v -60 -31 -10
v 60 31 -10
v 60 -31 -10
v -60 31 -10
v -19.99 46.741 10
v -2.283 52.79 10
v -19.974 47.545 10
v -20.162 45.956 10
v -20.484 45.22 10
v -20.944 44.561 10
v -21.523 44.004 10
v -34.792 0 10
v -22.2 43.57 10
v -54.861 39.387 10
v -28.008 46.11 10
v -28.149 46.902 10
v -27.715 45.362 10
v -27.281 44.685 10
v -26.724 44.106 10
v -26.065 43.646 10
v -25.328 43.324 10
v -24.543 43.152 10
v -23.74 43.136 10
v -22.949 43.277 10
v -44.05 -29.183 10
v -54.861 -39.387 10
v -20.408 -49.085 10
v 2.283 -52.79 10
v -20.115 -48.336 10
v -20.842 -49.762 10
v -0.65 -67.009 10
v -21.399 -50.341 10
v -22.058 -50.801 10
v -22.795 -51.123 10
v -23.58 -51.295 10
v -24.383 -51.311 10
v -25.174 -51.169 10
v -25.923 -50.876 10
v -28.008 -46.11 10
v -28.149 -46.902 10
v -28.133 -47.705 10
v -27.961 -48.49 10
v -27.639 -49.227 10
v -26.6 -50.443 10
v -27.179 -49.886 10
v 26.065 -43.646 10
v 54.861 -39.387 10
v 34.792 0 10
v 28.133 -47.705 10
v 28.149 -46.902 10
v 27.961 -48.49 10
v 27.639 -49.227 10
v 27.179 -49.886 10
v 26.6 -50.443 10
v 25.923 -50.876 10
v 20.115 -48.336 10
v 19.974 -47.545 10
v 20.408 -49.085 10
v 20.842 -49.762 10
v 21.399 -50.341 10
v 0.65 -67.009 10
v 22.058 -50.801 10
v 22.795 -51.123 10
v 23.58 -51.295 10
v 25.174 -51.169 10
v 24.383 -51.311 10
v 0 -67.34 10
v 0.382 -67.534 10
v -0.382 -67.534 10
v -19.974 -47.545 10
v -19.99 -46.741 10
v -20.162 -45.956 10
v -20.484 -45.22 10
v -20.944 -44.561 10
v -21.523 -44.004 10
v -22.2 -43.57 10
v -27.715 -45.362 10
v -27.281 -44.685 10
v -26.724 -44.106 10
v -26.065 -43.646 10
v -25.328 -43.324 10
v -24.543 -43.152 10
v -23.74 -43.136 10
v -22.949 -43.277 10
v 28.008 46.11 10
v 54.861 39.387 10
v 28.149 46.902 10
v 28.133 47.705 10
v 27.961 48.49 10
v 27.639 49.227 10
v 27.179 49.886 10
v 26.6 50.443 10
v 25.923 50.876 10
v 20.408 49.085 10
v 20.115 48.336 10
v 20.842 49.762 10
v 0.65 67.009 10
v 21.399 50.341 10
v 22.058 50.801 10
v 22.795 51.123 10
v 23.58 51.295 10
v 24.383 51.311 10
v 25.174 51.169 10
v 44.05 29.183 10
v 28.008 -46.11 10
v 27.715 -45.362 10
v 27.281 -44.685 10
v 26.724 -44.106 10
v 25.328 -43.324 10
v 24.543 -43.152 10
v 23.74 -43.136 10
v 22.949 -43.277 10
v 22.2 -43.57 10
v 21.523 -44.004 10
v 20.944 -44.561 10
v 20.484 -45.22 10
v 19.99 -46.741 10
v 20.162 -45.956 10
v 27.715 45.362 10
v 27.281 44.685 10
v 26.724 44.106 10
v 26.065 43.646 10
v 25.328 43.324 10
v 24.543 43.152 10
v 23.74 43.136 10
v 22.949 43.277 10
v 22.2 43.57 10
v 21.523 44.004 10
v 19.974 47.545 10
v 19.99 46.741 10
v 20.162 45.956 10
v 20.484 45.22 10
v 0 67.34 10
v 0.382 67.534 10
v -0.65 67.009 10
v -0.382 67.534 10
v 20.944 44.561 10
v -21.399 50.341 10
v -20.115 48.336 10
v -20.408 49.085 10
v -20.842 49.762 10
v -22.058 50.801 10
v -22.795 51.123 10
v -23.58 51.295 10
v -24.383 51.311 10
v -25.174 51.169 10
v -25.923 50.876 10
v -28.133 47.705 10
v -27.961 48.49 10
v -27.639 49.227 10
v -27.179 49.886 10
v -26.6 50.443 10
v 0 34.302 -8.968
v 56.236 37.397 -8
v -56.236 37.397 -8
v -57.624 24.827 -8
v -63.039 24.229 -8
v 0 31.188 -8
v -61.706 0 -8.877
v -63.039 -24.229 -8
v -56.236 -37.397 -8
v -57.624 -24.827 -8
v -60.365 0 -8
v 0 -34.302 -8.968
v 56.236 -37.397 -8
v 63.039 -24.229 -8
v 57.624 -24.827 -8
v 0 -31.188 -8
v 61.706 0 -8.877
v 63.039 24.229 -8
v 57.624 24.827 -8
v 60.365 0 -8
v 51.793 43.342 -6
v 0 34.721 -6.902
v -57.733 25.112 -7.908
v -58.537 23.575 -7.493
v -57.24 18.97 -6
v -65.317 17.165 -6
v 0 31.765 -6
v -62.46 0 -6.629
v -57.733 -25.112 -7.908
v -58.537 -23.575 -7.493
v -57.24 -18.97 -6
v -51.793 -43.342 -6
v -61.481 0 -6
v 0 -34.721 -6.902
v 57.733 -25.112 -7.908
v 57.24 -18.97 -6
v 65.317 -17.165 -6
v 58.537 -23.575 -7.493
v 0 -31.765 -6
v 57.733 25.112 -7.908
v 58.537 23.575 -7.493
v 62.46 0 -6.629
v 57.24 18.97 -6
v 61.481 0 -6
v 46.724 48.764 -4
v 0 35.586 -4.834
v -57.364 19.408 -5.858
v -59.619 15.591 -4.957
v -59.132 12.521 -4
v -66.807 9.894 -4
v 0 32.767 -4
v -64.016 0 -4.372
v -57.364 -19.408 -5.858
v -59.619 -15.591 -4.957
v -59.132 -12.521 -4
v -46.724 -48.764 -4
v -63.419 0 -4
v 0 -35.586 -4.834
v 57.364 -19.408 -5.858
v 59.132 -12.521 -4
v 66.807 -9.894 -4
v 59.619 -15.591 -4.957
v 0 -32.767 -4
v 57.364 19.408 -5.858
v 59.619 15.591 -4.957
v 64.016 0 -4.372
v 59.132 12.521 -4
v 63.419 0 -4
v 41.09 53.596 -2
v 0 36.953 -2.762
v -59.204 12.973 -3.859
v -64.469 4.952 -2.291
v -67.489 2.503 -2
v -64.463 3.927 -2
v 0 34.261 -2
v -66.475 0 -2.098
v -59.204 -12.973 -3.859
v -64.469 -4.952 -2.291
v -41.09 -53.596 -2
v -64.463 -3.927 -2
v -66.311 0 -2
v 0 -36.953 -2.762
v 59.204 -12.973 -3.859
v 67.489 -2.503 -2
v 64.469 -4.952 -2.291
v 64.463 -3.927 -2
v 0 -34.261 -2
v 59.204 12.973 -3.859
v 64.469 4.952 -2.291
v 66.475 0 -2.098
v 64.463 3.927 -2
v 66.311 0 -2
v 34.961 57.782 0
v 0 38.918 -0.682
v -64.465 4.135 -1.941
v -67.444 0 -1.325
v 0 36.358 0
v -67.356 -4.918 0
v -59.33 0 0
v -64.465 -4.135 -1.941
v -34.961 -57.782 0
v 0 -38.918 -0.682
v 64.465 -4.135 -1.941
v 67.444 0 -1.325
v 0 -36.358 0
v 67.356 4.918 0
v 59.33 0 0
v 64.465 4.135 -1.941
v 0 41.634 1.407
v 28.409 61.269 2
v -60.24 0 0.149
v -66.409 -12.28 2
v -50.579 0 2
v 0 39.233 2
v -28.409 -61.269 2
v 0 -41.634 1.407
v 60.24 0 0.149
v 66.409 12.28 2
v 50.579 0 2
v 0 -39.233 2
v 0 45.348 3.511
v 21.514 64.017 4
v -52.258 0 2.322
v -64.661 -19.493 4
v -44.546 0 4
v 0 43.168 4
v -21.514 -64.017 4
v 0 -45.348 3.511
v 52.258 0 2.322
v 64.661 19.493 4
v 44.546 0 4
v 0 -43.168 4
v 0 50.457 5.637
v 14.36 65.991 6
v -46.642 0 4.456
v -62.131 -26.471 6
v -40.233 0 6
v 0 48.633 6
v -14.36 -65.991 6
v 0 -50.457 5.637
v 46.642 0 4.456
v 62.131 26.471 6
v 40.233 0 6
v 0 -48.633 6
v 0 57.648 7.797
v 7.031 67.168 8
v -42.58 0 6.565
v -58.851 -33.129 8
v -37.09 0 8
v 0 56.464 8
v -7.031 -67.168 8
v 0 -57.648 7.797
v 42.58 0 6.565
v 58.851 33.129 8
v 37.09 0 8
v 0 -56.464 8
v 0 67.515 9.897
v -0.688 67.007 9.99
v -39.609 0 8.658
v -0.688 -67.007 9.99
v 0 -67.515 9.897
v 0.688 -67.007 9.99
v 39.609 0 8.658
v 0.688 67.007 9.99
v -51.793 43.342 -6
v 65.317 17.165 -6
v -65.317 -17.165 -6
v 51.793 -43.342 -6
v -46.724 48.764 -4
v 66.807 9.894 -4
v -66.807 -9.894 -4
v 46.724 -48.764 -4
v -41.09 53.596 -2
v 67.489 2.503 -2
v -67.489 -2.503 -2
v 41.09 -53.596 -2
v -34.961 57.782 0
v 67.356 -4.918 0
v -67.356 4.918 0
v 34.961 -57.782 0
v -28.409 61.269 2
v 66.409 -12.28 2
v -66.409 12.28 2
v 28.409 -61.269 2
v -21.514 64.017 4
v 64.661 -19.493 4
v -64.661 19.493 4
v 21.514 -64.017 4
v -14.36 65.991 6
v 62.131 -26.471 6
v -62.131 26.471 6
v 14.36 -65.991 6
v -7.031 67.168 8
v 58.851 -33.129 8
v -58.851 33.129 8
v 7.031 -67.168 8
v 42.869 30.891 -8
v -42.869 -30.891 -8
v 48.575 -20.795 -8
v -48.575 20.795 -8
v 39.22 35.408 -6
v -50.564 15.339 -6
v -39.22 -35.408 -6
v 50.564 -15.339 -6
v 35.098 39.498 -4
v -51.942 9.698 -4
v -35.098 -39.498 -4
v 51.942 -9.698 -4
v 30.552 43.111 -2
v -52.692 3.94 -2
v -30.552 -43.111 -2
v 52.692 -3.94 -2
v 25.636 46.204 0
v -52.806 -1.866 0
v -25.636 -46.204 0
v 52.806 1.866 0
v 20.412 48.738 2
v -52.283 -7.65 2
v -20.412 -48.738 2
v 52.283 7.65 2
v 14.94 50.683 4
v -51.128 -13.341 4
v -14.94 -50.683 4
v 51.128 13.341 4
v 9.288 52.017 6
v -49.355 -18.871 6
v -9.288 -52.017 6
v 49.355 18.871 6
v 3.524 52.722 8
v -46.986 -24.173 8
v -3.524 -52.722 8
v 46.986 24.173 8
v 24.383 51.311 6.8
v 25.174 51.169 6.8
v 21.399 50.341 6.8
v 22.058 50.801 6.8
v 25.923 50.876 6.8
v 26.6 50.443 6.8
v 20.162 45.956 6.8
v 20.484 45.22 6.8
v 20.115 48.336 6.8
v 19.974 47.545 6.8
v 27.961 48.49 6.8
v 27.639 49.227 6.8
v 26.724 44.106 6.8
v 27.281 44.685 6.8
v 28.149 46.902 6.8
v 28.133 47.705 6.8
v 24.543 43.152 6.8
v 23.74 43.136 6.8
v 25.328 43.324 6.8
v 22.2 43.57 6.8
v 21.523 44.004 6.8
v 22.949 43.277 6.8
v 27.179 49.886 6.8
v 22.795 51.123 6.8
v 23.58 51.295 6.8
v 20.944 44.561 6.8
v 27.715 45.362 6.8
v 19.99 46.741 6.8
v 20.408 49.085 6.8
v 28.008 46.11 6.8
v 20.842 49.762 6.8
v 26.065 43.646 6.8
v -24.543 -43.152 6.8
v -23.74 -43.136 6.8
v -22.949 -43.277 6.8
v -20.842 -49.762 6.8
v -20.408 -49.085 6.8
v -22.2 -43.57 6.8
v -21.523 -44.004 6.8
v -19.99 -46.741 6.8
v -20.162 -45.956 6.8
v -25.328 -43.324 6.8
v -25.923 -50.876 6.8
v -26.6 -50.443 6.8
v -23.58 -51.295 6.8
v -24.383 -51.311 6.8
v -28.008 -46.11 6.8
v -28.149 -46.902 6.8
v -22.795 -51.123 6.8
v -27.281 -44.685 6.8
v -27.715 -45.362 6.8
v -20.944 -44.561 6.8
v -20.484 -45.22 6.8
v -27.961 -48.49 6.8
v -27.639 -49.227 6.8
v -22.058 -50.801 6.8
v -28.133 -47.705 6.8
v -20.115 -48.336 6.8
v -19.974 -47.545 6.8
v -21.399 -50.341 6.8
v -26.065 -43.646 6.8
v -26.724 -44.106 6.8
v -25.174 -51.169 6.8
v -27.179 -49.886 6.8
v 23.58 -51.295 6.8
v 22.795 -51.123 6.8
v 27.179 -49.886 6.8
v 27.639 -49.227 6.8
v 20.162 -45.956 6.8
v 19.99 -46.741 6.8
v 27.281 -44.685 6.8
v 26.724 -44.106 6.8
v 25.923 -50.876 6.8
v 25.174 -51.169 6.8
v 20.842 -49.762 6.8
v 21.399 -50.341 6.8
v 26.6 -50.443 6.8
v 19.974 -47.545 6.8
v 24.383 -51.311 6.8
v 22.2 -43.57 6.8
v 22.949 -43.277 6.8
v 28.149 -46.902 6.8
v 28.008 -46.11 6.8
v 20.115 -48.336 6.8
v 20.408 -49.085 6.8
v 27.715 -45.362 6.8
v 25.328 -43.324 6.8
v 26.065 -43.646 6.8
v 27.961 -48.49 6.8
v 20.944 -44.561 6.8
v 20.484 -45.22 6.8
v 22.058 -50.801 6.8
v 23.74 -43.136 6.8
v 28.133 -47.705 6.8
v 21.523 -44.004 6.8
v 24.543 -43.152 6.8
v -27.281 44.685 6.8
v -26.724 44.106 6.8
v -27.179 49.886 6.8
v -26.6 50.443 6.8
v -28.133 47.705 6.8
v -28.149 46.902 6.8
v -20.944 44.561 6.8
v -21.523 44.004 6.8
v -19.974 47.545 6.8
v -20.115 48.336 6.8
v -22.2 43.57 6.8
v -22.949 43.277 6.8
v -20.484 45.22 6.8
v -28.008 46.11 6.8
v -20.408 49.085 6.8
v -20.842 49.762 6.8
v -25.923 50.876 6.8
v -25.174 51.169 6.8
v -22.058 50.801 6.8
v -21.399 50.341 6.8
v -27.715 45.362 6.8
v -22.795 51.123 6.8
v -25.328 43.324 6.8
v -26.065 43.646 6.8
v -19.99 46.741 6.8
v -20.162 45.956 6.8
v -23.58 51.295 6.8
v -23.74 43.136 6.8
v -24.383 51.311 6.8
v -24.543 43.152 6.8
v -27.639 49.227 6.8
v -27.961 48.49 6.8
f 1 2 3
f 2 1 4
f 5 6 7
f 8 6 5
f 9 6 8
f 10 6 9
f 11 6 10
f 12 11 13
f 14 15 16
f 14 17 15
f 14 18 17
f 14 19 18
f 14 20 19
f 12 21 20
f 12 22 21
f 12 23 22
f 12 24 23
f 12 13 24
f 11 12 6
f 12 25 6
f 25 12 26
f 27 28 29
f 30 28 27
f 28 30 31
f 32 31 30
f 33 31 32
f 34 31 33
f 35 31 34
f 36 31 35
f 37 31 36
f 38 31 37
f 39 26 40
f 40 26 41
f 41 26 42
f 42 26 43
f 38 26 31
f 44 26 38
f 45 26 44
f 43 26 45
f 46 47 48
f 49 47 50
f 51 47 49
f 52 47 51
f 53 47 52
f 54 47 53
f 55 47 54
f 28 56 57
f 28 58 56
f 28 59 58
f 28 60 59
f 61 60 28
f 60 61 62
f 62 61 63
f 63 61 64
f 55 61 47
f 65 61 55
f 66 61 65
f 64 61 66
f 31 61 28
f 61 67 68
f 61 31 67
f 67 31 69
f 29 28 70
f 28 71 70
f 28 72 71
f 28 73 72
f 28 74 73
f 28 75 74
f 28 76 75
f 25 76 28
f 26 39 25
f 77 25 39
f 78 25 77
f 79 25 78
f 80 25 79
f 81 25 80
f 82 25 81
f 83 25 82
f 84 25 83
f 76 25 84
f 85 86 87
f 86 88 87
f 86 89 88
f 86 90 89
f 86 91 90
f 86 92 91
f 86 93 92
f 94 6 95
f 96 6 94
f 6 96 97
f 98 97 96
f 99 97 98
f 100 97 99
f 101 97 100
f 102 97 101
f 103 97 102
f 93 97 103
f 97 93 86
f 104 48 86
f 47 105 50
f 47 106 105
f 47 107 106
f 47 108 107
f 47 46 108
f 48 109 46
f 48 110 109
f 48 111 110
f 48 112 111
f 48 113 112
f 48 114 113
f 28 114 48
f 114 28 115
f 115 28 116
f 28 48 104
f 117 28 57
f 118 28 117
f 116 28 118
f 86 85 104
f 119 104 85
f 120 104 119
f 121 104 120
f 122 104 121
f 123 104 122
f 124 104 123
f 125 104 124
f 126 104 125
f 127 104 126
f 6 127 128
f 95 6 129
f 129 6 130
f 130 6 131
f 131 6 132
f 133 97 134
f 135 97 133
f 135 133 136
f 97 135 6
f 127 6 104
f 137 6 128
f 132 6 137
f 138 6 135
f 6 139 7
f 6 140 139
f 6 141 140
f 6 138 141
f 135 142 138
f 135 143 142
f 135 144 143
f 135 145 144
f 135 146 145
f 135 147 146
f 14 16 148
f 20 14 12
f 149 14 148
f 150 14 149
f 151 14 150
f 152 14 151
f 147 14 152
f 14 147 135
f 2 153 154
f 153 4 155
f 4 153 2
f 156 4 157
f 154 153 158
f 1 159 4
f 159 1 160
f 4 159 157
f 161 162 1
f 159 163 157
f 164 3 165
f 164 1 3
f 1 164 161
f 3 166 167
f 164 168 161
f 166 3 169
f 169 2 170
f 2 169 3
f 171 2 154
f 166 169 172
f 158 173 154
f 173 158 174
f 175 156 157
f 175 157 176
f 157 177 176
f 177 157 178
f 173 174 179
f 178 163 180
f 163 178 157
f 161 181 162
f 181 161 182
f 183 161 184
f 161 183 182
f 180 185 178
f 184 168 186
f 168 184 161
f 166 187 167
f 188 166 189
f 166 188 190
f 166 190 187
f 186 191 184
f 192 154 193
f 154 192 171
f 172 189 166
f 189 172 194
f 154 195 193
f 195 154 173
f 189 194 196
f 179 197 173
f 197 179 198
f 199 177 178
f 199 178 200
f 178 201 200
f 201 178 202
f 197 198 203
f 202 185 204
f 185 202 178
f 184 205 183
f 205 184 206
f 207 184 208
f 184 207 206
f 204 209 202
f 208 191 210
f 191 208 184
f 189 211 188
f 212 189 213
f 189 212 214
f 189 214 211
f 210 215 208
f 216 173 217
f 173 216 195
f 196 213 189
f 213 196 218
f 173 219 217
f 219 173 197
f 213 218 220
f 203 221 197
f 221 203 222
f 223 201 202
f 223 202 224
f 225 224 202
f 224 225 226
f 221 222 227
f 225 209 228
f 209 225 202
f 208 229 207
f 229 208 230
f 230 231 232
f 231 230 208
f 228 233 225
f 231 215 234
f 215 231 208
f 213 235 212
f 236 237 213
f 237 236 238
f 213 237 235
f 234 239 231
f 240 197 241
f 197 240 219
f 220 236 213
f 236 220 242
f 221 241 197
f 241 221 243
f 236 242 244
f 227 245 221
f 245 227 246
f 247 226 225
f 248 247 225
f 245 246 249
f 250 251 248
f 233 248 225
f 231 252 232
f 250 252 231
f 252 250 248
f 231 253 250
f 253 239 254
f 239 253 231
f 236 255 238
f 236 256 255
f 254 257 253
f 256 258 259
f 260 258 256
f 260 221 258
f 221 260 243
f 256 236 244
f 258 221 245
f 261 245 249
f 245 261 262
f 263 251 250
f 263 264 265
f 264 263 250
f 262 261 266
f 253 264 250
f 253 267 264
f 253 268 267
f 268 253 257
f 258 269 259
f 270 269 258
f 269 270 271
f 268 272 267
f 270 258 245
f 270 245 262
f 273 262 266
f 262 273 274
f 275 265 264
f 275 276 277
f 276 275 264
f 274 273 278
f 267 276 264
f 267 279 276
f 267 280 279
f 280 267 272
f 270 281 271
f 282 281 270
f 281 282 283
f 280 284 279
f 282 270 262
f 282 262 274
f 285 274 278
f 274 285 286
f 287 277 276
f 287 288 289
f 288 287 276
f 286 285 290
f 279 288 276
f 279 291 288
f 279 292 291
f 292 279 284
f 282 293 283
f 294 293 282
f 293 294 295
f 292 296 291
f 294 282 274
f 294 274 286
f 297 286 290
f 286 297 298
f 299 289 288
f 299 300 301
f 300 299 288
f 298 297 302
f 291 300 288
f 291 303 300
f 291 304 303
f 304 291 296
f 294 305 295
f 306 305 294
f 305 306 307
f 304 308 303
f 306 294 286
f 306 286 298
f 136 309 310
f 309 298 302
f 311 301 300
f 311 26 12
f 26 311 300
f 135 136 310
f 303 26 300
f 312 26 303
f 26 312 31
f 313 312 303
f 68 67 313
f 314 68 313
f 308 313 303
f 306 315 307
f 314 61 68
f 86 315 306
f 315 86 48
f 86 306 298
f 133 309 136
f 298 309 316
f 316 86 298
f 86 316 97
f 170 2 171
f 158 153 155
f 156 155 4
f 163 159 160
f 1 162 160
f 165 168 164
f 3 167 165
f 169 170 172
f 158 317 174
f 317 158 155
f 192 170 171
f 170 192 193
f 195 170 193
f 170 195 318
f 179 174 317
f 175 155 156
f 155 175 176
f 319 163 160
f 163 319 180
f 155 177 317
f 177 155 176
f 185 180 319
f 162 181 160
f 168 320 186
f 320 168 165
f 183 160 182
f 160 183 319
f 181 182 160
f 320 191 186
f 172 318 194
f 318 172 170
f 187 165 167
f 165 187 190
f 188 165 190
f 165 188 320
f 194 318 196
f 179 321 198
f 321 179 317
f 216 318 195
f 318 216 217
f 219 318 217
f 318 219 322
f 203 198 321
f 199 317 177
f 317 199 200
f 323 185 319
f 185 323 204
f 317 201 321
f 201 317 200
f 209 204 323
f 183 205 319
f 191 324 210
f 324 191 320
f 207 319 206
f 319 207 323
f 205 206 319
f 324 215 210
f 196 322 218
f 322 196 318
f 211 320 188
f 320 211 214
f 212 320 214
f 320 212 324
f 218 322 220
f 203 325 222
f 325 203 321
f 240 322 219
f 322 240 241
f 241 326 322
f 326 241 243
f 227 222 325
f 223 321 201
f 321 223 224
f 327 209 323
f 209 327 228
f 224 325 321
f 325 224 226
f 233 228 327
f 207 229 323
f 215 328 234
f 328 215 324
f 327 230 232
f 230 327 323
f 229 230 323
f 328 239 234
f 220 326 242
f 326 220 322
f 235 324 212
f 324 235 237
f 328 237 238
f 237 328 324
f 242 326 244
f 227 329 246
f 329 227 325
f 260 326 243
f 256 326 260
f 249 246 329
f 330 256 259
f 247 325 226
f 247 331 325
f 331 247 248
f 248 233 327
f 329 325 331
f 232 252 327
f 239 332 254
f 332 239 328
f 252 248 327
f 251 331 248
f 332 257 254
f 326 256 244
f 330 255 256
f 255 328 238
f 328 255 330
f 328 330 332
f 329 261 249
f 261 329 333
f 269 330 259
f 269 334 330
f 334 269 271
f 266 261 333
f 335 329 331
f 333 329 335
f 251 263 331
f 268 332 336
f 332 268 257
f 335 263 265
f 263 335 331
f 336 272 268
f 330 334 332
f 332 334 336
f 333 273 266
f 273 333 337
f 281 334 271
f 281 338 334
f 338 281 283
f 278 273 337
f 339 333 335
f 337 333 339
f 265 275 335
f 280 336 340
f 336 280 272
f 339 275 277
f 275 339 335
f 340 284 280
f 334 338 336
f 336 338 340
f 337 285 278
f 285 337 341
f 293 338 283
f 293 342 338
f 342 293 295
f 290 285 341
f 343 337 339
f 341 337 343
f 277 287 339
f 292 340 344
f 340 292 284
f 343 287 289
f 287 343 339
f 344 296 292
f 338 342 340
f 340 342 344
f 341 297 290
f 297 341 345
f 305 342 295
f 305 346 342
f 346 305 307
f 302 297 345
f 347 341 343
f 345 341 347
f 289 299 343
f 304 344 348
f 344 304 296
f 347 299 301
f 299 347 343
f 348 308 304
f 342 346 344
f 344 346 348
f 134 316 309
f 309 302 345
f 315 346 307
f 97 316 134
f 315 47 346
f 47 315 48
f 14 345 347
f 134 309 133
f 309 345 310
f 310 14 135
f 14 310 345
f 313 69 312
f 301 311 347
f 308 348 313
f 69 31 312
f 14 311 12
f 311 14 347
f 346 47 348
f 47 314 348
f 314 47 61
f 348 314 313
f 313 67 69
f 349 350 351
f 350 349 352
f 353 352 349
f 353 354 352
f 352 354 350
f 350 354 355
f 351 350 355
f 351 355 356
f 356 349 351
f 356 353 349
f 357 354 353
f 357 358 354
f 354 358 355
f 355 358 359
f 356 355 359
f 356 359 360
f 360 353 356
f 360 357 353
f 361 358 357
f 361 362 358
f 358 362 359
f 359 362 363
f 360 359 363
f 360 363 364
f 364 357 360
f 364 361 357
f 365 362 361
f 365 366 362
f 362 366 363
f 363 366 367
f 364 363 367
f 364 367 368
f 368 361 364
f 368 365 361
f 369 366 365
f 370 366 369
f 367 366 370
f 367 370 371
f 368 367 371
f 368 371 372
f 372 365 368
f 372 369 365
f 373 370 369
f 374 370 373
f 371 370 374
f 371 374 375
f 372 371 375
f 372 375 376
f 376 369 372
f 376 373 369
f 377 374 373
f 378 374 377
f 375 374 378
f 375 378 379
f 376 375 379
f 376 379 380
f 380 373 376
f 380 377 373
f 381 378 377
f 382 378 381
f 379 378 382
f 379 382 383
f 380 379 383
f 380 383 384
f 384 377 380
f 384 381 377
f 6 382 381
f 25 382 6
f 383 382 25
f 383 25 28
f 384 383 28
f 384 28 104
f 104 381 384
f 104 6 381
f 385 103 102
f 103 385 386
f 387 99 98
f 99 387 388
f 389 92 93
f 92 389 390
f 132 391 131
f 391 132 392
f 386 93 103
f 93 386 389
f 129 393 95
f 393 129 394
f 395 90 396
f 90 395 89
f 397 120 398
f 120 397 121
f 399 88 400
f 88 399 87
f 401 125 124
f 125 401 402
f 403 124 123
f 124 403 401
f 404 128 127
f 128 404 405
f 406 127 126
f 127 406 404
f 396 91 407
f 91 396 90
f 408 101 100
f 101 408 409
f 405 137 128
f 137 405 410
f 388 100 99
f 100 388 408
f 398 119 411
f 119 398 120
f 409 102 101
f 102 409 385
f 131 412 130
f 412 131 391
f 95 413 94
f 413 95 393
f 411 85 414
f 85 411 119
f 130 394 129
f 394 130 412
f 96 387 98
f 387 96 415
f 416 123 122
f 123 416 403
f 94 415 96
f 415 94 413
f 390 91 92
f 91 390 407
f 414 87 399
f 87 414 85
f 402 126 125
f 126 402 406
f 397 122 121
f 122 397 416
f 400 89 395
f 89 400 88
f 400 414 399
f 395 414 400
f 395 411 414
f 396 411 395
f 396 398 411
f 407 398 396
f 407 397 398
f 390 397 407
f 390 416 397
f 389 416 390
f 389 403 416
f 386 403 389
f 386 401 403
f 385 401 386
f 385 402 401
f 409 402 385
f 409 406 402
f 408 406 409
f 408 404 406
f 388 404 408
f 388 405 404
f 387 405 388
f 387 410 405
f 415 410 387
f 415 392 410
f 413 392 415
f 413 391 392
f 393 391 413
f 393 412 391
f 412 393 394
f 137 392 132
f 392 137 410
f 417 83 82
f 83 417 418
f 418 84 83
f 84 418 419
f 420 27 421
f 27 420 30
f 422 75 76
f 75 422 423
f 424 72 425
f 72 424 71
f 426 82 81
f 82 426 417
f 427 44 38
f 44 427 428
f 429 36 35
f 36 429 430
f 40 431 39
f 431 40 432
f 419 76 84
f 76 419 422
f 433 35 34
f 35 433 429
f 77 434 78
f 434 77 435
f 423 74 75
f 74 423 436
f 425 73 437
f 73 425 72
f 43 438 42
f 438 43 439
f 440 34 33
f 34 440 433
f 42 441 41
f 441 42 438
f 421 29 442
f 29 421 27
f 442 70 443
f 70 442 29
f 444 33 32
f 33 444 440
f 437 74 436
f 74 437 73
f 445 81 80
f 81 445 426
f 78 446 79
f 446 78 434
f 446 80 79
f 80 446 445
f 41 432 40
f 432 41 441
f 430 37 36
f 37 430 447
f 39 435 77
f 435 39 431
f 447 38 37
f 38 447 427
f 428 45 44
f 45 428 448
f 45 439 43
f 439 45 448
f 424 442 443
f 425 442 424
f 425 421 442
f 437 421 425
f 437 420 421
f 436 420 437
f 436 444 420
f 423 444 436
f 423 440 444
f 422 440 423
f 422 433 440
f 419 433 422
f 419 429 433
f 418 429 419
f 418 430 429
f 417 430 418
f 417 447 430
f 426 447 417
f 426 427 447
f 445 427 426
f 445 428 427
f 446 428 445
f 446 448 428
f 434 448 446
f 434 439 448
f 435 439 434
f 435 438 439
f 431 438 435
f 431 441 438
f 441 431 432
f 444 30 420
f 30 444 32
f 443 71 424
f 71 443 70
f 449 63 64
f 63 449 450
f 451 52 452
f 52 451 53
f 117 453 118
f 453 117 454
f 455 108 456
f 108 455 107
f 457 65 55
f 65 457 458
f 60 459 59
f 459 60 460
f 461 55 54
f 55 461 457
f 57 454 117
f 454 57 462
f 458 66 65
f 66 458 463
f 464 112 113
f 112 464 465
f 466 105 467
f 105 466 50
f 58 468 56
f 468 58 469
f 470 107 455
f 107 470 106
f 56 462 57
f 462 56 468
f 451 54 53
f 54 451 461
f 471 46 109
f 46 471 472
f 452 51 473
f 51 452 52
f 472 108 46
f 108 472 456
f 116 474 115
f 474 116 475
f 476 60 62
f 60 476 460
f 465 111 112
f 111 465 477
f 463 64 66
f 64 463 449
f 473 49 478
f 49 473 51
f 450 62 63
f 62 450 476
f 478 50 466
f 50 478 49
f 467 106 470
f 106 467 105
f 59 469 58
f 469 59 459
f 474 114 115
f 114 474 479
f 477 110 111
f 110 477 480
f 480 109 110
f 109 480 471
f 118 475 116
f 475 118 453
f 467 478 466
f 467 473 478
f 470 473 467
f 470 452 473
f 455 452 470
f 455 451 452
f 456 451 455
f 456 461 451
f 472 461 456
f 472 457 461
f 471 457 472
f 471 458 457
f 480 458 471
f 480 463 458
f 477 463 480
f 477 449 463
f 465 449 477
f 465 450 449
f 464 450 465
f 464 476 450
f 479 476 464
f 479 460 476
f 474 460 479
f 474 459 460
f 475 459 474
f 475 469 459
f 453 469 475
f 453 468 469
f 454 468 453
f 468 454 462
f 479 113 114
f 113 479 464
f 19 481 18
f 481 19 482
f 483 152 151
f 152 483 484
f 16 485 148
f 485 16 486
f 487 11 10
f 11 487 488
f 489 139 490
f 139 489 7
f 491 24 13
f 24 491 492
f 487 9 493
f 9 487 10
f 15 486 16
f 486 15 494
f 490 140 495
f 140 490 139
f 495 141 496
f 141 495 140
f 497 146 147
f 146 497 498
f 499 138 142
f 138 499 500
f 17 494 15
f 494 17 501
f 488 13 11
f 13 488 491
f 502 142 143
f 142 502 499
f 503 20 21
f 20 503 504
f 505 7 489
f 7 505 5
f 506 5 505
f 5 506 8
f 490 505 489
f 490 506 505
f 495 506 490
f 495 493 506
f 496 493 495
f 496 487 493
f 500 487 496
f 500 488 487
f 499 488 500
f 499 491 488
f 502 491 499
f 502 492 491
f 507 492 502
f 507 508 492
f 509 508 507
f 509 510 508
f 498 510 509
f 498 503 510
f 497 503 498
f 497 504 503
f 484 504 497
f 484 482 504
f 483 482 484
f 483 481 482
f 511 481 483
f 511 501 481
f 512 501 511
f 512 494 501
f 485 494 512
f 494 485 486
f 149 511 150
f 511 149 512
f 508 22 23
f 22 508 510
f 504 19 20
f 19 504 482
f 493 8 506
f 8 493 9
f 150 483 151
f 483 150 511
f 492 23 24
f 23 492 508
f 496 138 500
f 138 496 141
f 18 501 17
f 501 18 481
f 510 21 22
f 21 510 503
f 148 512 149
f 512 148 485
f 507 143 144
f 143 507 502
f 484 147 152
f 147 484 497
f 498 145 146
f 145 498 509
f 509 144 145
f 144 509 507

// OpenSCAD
// Tarjetero V0 
// Diseñado por Fabián Fagua
// 22 Mayo 2018

//********************************************

Gab_Mag = 14; //Gab Magnet, Espacio para el iman
X_Poly = 92/2;  // Largo de la Tarjeta de presentacion 
Y_Poly = 52/2;  // Ancho de la Tarjeta
H = 20 ; // Altura del objeto

D_Mag = 8.2 ; // Diametro del iman
H_Mag = 3.2 ; // Altura del iman 

E= 5; // Espesor
Vec_Poly_Ext = [[X_Poly+Gab_Mag,Y_Poly+E],[-(X_Poly+Gab_Mag),Y_Poly+E],[-(X_Poly+Gab_Mag),-(Y_Poly+E)],[X_Poly+Gab_Mag,-(Y_Poly+E)]];
Vec_Poly_Int = [[X_Poly,Y_Poly],[-X_Poly,Y_Poly],[-X_Poly,-Y_Poly],[X_Poly,-Y_Poly]];

Twist_Obj = 63; 
Slices_Obj = 10;
Rot_Slice = Twist_Obj / Slices_Obj;
H_Slice = H/Slices_Obj;
echo ("Altura Capa es: ",H_Slice," mm");
echo ("Rotacion por Capa es: ",Rot_Slice,"°");

*polygon(points=Vec_Poly_Ext);
*color("red")
*polygon(points=Vec_Poly_Int);

difference()
{
    union()
    {
        linear_extrude(height = H, center = true, convexity = 0, twist = -Twist_Obj, slices = Slices_Obj)
        //translate([2, 0, 0])
        //circle(r=10);
        polygon(points=Vec_Poly_Ext);

       // color("red")
        linear_extrude(height = H, center = true, convexity = 0, twist = Twist_Obj, slices = Slices_Obj)
        //translate([2, 0, 0])
        //circle(r=10);
        polygon(points=Vec_Poly_Ext);
    }



    rotate([0,0,Rot_Slice])
    translate([0,0,H_Slice])
    union()
    {
        linear_extrude(height = H, center = true, convexity = 0, twist = -Twist_Obj, slices = Slices_Obj)
        //translate([2, 0, 0])
        //circle(r=10);
        polygon(points=Vec_Poly_Int);

      * color("red")
        linear_extrude(height = H, center = true, convexity = 0, twist = Twist_Obj, slices = Slices_Obj)
        //translate([2, 0, 0])
        //circle(r=10);
        polygon(points=Vec_Poly_Int);
    }
    //color("red")
    rotate([0,0,Twist_Obj])
        translate([X_Poly+Gab_Mag/2,0,H/2-H_Mag])
            cylinder(d=D_Mag, h=H_Mag, ceneter=true, $fn=32);
    //color("red")
    rotate([0,0,Twist_Obj])
        translate([-(X_Poly+Gab_Mag/2),0,H/2-H_Mag])
            cylinder(d=D_Mag, h=H_Mag, ceneter=true, $fn=32);
        //color("red")
    rotate([0,0,-Twist_Obj])
        translate([X_Poly+Gab_Mag/2,0,H/2-H_Mag])
            cylinder(d=D_Mag, h=H_Mag, ceneter=true, $fn=32);
    //color("red")
    rotate([0,0,-Twist_Obj])
        translate([-(X_Poly+Gab_Mag/2),0,H/2-H_Mag])
            cylinder(d=D_Mag, h=H_Mag, ceneter=true, $fn=32);
}



/*
 linear_extrude(height=10, scale=[1,0.1], slices=20, twist=0)
 polygon(points=[[0,0],[20,10],[20,-10]]);
 */
